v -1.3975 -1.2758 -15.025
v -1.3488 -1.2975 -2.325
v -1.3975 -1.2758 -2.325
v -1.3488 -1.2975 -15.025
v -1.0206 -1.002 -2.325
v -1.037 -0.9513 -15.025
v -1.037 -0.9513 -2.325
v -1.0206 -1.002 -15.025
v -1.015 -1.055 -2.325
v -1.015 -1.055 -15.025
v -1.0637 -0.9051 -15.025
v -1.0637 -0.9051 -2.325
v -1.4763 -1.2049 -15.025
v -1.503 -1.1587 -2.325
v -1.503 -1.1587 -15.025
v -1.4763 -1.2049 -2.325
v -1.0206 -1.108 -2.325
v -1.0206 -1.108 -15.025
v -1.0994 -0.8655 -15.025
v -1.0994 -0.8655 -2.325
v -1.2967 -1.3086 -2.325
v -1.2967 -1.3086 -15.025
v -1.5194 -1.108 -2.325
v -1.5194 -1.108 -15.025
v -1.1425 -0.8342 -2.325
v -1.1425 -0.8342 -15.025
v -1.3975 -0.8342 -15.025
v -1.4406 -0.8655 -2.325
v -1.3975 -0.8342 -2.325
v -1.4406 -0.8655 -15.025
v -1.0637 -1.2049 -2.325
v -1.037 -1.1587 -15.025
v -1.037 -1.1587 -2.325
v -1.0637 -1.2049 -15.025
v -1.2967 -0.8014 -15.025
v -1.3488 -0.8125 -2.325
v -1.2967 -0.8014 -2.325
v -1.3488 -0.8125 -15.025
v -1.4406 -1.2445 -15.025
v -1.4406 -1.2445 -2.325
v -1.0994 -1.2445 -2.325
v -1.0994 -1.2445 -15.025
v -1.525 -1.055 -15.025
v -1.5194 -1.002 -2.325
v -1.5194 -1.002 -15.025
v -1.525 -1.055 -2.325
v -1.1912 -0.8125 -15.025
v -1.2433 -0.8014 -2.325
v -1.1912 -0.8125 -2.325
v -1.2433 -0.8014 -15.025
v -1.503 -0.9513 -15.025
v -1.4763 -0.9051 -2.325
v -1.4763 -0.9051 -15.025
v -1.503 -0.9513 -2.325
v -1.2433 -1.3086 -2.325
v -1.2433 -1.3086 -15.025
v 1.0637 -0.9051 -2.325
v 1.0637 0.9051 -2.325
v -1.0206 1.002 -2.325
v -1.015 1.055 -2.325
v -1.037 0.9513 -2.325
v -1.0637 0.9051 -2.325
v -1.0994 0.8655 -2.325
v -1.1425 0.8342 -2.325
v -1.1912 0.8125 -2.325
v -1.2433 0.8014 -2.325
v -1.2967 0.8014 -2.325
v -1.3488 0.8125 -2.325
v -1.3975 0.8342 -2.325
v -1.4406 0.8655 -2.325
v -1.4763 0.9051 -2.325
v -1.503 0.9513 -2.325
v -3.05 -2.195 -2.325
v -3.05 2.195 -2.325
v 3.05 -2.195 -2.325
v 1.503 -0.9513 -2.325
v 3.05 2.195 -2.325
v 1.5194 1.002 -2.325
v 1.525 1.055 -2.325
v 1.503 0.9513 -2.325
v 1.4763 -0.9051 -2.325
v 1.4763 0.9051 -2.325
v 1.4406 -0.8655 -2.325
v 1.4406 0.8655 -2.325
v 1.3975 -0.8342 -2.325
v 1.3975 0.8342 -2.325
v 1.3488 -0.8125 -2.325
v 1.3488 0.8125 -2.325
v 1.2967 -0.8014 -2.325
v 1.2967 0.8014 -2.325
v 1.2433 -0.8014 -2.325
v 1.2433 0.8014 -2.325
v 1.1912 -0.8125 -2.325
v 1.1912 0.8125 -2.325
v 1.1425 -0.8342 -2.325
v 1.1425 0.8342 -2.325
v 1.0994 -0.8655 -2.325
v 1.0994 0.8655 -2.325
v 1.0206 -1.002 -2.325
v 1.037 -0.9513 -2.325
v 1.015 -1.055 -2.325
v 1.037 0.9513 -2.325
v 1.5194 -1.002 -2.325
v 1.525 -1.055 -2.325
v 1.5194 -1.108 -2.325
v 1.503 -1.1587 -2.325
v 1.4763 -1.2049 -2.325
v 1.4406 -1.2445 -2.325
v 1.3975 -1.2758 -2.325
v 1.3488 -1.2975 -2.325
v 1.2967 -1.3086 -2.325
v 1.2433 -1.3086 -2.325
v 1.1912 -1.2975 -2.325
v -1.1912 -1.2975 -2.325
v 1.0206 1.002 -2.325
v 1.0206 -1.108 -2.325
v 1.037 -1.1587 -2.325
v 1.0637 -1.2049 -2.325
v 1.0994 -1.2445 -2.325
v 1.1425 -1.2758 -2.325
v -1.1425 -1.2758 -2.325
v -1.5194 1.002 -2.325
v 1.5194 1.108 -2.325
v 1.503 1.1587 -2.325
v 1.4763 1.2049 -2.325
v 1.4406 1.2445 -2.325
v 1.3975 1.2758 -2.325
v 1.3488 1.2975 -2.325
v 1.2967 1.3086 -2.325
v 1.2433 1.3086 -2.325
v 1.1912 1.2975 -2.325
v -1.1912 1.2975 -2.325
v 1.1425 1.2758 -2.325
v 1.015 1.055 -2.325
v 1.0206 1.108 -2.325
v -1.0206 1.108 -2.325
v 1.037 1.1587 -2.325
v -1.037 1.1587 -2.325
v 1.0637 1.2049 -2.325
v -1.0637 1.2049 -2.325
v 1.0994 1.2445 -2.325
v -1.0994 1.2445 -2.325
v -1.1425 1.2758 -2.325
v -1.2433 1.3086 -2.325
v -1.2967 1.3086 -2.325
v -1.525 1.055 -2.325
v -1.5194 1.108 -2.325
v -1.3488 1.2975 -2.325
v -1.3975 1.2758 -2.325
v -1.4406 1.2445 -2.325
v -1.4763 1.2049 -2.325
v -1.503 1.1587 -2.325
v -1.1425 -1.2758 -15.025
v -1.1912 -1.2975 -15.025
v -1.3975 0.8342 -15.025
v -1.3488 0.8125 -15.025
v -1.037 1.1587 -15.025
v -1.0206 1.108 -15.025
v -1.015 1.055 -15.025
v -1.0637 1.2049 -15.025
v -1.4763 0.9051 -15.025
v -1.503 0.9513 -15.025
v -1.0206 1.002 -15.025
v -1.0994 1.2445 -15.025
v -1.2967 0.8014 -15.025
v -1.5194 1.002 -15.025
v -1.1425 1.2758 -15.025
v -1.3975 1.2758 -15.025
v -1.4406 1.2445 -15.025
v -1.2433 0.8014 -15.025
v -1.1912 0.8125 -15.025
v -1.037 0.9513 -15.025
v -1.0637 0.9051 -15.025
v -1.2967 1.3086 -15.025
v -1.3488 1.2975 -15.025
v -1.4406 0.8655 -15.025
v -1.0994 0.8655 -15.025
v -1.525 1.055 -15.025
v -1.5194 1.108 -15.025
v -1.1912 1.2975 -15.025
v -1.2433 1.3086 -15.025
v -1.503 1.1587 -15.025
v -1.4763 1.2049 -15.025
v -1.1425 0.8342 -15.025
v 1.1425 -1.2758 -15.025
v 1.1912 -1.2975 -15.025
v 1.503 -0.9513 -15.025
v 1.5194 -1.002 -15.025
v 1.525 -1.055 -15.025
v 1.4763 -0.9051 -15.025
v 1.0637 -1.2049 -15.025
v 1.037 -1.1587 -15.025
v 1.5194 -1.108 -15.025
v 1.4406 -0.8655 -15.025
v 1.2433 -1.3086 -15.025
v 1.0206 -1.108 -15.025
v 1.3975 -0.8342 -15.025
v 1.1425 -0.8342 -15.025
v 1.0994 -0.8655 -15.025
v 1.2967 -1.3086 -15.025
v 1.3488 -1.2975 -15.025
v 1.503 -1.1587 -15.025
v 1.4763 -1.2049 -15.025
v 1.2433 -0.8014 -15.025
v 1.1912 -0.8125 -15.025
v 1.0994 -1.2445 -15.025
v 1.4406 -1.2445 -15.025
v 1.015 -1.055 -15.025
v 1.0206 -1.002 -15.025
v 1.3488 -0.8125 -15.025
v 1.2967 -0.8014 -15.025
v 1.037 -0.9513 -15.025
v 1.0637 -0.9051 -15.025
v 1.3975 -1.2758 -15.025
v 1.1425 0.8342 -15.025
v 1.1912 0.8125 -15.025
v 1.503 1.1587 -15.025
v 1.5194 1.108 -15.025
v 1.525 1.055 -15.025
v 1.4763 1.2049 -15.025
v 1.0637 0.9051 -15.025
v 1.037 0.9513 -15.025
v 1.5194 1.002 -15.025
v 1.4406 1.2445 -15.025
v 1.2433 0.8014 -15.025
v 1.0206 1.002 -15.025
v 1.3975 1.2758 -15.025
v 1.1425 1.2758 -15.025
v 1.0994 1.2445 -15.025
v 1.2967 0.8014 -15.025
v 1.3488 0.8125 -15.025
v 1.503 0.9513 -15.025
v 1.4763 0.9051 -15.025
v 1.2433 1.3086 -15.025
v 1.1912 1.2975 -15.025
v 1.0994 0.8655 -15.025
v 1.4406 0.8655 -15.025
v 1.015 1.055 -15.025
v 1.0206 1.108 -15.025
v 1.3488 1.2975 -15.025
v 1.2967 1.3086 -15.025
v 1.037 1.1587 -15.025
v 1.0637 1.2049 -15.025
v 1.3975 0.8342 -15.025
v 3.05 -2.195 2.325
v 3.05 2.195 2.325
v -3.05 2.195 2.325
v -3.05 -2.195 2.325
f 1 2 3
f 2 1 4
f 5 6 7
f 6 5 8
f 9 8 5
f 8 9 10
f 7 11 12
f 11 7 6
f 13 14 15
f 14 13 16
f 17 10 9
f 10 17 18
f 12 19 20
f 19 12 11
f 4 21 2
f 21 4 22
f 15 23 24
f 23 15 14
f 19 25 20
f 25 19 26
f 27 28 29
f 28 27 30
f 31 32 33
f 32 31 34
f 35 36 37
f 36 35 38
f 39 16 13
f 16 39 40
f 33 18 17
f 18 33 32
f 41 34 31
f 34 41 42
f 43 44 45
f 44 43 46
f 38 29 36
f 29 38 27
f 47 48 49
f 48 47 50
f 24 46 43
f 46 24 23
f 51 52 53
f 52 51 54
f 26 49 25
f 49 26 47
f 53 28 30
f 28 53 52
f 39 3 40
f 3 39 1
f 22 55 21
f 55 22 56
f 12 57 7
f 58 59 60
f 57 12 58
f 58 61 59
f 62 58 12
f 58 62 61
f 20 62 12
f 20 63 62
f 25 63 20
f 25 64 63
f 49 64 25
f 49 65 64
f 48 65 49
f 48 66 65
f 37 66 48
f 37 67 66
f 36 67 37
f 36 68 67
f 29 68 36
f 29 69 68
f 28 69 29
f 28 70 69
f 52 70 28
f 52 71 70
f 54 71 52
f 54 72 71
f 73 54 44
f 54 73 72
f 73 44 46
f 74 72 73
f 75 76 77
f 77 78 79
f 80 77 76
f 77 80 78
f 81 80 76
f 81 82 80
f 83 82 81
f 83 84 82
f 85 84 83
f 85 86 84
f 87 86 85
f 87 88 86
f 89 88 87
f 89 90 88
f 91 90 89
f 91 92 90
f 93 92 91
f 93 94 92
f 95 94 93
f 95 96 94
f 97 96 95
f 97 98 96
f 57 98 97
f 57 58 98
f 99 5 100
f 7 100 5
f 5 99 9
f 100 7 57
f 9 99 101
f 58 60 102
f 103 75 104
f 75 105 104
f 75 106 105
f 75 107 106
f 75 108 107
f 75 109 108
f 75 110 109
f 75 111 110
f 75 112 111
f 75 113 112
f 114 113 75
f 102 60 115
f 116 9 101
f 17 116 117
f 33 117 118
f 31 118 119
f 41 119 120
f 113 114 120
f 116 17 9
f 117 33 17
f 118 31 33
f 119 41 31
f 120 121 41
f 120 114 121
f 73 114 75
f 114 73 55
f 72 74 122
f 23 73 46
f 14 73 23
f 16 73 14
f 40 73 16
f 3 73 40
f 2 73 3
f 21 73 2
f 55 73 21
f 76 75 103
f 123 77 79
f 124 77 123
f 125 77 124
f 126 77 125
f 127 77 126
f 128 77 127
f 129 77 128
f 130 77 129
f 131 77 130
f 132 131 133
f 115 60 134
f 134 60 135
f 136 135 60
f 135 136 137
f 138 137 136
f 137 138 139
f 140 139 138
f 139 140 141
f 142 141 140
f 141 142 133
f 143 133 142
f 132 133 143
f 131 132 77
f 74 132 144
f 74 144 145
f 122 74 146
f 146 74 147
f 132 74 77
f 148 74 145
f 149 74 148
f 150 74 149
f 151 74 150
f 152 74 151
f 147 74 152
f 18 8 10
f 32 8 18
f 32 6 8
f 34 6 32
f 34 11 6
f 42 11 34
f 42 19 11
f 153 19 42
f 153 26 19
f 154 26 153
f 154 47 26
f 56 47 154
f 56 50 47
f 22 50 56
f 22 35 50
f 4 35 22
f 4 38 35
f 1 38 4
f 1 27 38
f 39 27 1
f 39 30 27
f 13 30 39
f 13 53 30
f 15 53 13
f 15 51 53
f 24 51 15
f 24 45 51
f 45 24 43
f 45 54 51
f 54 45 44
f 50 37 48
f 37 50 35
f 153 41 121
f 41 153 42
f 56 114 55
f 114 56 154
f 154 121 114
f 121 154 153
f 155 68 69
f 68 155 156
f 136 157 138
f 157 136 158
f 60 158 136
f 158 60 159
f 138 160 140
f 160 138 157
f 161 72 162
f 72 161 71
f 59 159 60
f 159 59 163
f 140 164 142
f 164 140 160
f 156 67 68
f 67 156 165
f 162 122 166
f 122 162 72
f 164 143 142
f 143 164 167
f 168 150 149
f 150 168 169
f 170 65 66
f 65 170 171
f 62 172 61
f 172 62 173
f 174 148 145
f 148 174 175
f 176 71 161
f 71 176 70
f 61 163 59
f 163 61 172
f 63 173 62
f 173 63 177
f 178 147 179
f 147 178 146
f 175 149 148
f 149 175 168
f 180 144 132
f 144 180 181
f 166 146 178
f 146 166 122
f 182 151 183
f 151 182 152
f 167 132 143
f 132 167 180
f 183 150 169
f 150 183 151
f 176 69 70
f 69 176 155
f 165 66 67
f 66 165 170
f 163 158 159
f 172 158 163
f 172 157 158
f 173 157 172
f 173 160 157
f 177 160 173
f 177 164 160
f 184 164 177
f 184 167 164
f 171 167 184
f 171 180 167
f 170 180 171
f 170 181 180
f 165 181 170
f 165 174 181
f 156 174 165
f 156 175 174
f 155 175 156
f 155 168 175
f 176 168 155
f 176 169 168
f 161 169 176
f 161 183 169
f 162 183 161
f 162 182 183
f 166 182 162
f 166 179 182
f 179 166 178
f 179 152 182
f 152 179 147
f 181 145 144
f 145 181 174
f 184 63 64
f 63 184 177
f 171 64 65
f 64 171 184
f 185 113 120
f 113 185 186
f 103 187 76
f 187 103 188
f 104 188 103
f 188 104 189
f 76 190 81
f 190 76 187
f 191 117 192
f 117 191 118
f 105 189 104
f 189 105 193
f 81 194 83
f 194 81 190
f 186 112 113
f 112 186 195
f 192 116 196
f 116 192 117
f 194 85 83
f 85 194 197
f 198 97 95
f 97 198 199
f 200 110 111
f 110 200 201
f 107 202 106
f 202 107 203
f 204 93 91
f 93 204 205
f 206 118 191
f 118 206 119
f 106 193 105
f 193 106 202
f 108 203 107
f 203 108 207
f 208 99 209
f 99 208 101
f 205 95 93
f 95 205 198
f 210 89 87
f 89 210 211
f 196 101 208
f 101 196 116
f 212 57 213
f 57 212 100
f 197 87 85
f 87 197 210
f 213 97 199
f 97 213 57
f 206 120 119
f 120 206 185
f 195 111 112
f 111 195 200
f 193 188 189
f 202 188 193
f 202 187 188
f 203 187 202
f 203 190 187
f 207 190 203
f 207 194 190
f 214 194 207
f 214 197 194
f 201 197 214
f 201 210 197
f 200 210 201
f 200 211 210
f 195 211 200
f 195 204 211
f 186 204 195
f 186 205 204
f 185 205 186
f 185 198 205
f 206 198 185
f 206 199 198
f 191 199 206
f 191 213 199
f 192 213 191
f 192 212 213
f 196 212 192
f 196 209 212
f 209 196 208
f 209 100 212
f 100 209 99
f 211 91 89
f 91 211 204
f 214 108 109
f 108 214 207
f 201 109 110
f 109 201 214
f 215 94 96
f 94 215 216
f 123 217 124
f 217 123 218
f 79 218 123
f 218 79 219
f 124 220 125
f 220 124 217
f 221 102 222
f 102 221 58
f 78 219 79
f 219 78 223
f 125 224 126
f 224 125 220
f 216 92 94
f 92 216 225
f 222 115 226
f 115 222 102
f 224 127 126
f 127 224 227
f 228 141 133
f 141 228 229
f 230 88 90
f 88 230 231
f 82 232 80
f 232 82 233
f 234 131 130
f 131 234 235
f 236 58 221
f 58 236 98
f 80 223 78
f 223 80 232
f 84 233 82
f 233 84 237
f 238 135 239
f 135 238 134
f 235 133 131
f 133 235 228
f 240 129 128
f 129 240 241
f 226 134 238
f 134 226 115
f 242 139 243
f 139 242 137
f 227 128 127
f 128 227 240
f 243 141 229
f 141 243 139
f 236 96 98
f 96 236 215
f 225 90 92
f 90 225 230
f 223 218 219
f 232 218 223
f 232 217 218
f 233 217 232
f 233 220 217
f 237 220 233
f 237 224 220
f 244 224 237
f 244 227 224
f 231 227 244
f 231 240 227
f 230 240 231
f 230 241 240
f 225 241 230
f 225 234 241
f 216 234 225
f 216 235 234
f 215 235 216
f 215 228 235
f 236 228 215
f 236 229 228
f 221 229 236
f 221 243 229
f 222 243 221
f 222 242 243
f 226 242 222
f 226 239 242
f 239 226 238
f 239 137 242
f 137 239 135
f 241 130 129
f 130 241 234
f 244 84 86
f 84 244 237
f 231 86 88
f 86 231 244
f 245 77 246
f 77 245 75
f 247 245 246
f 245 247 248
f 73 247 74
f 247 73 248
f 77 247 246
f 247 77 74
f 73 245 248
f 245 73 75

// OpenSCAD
// file: ../settings.scad
// Common settings used by all scad files.

// ALL UNITS IN MILLIMETERS (MM)!!!

$fn = 30;//low-res but fast to render
//$fn = 50;//higher-res but slow to render

pi = 3.1415926535897932384626433832795;

max_footprint = 150; // 15x15 cm

bottom_clearance = 10;
bottom_clearance = 25.4/2+10;
//bottom_clearance = 30;

shell_alpha = 0.215;
//shell_alpha = 1.0;

tolerance = 0.5;

// Flat countersunk M2.5mm x 0.45mm machine screw.
screw_thread_diameter = 2.5;//2.8;//2.75;//2.4?
screw_thread_length = 5;//?
screw_head_diameter = 4.75; // M2.5
//screw_head_diameter = 5.2; // M3
screw_head_height = 1.5;//2;

screw_thread_diameter2 = 2;

unit_thickness = 5;
u = unit_thickness;

shell_thickness = unit_thickness;

// Show flags.
show_platform = 0;
show_head = 1;
show_head_shell = 0;
show_head_electronics_bb = 0;
show_battery = 1;
show_foot_cube = 0;
show_torso = 0;
show_motor = 0;
show_motor_plates = 1;
show_motor_inner_plates = 1;
show_motor_outer_plates = 1;
show_wheel = 0;//obsolete
show_tracks = 1;//
show_track_wheels = 1;
show_caster = 0;
show_rpi = 1;
show_vertical_plates = 1;//
show_horizontal_plates = 1;//
show_caster_plates = 0;//obsolete?
show_camera = 1;
show_screen = 0;
show_edge_mount = 1;
show_sonar_mount = 1;
show_recharge_mount = 1;
show_conduit = 1;
show_torso_shell = 1;
show_recharge_dock = 0;
show_head_tilt_axis = 0;
show_rpi_camera_axis = 0;
show_laser_axis = 0;

head_vertical_angle_tilt = 0;
//head_vertical_angle_tilt = 30;//max
//head_vertical_angle_tilt = 10;

torso_height = 120+20;

base_plate_diameter = max_footprint-unit_thickness*2;
base_plate_frame = 0;

head_height = 50;
head_offset_z = max_footprint/2;
head_middle_cutout = 85;

rpi_with_four_hats_and_clearance = 76;

qrd1114_w = 6.10;
qrd1114_l = 4.39;
qrd1114_h = 4.65;

dock_radius = 10;
dock_gripper_border = 2;
dock_gripper_instep = 0.9;
dock_gripper_cutout_tapper = 50;
dock_receiver_height = 5;

// Patriod Fuel+ 9000 mAh
battery_length = 90;
battery_width = 57;
battery_height = 23;
battery_offset_z = 30;//4;

wheel_diameter = 50;
wheel_offset_x = 65;
wheel_offset_z = wheel_diameter/2;
wheel_axle_diameter = 5;

//caster_diameter = 19.05; // 0.75 inches
caster_diameter = 25.45; // 1 inches
//caster_diameter = 15.875; // 5/8 inches
caster_holder_diameter = 30;//31;
caster_offset_y = base_plate_diameter/2 - caster_holder_diameter/2;

arduino_offset_x = 0;
arduino_offset_y = 0;
arduino_offset_z = 67;
arduino_offset_x2 = 0;
arduino_offset_y2 = -20;
arduino_offset_z2 = torso_height+bottom_clearance;

horizontal_plate_width = unit_thickness*8*2 - unit_thickness*2;
horizontal_plate_depth = unit_thickness*8*2;

vertical_plate_width = horizontal_plate_depth;
vertical_plate_height = unit_thickness*8;
vertical_plate_offset_x = wheel_offset_x-22.5;
vertical_plate_offset_z = vertical_plate_height/2 + unit_thickness/2;

vertical_battery_plate_height = 100 - 15;

caster_plate_width = horizontal_plate_width + unit_thickness*2;
caster_plate_mount_length = unit_thickness*4;
caster_plate_width_minor = caster_holder_diameter;

motor_switch_length = 20;
motor_switch_thickness = 6.5;
motor_switch_height = 11;
motor_switch_height_leads = 23;
motor_switch_on_height =  13.3;
motor_switch_hole_diameter = 2.5;
motor_switch_hole_offset_z = 6.5;//this plus diameter/2 is hole center from switch top
motor_switch_hole_spacing = 7.1;// holes are diameter/2 from this

motor_length = 60;
motor_width = 25;
motor_collar_width = 7;
motor_collar_height = 2.5;
motor_axle_width = 4;
motor_axle_height = 9.5;
motor_offset_x = 10;
//motor_offset_y = motor_width/2+5;
motor_offset_y = unit_thickness*3.5;
motor_offset_z = vertical_plate_height/2 - unit_thickness/2;//4;//30;
motor_mount_holes_dist = 17;
// motor countersink hole
motor_mount_holes_width = 3; // M3
motor_mount_holes_head_height = 2.2;
motor_mount_holes_head_width = 5.8;
motor_bearing_outer_diameter = 10;
motor_bearing_inner_diameter = 5.95;
motor_bearing_thickness = 2.5;

motor_unimount_idler_axle_d = screw_thread_diameter;
//motor_unimount_spacer_depth = 0.1;//too small
motor_unimount_spacer_depth = 0.5;

motor_arm_offset_y = -u*3;
motor_arm_offset_z = u*.5;

motor_plate_width = vertical_plate_width;
motor_plate_height = vertical_plate_height;
motor_plate_thickness = unit_thickness;
motor_plate_offset_z = vertical_plate_offset_z;

motor_plate_middle_thickness = 5;

wheel_hub_offset = u*3;

motor_hole_height_offset = -5;

nylon_spacer_outer_diameter = 6.35;
nylon_spacer_inner_diameter = 3.302;
nylon_spacer_length = 12.7;

track_width = unit_thickness*3;
track_offset_x = -50;
track_offset_z = .1;
//track_wheel_radius = 19;//original
track_wheel_radius = 14;
//track_wheel_hole_radius = (nylon_spacer_outer_diameter+1)/2;
track_wheel_hole_radius = motor_bearing_outer_diameter/2;

track_driver_hole_radius = (motor_axle_width)/2 + 0.1;
track_driver_set_screw_head_d = 4.1;
track_driver_set_screw_shaft_d = 2.4;
//track_wheel_width = 13.5;//original
track_wheel_width = u*2;
track_wheel_width_buffer = u*0.25;
track_offset = 3;        //distance from chassis
track_wheel_offset = track_offset;
//track_length = 250; // see tread_triangle.py, too big
//track_length = 240; // see tread_triangle.py
//track_length = 238; //inc/dec in 10 unit increments so notches match idlers
track_length = 228; //inc/dec in 10 unit increments so notches match idlers
track_radius = track_length/2/pi;
track_wheel_show_fancy = 1;
track_wheel_gap = track_wheel_width + track_wheel_width_buffer*2;
track_axle_bearing_diameter = motor_bearing_inner_diameter - 0.1;
track_tensioner_radius = 12;
track_nut_height = 3.5; //TODO
track_punchout_thickness = 0.25;//should be the same as the minimum layer thickness

head_slew_bearing_outer_diameter = 115;
head_slew_bearing_ring_thickness = 20;
head_slew_bearing_inner_diameter = head_slew_bearing_outer_diameter - head_slew_bearing_ring_thickness;
//head_slew_bearing_hole_diameter = head_slew_bearing_inner_diameter - head_slew_bearing_ring_thickness;
head_slew_bearing_hole_diameter = 12+tolerance; // slip ring https://www.adafruit.com/products/775
//head_slew_bearing_ball_diameter = 5;
head_slew_bearing_ball_diameter = 2.5; //u/2;
head_slew_bearing_height = u;//head_slew_bearing_ball_diameter*2;
head_slew_bearing_gap = 0.5;
head_slew_bearing_slew_gap = 0;
head_slew_bearing_gap_factor = 0.1;

neck_strut_width = u*7;
neck_strut_height = u*18;
neck_strut_spacing = u*8;

show_outer_race = 0;
show_inner_race_a = 1;
show_inner_race_b = 1;
show_balls = 0;
// main file
include <../settings.scad>;

module make_QRD1114(leads=1, shell_thickness=0){
	union(){
	    cube([qrd1114_w+shell_thickness, qrd1114_l+shell_thickness, qrd1114_h+shell_thickness], center=true);
	    if(leads){
    		for(i=[-1:2:1]){	for(j=[-1:2:1]){
    			translate([2.54/2*i, 2.11/2*j, -12.7/2-4.65/2])
    			cylinder(d=0.51, h=12.7, center=true);
    		}}
		}
	}
}

module make_QRD1114_housing_bb(shell_thickness=1){
    t = tolerance;
    union(){
        // main body
        cube([qrd1114_w+shell_thickness+t, qrd1114_l+shell_thickness+t, qrd1114_h+shell_thickness+t], center=true);
        
        // lead bb
        cube([
            qrd1114_w+t-1.5, // width
            qrd1114_l+shell_thickness+t, // height
            qrd1114_h+15+t // depth
        ], center=true);
    }
}

module make_QRD1114_housing(shell_thickness=1){
	t = tolerance;
    difference(){

        // main body
        make_QRD1114_housing_bb();

        // interior hollowing
        cube([qrd1114_w+t, qrd1114_l+t, qrd1114_h+t], center=true);
        
        // top cutout
        translate([0,shell_thickness*2,0])
        cube([qrd1114_w+t-0.5, qrd1114_l+t, qrd1114_h+t], center=true);
        
        // front/back cutout
        translate([0,0.5,0])
        cube([qrd1114_w+t-1.5, qrd1114_l+t+1, (qrd1114_h+t)*2], center=true);

    }
}

make_QRD1114();
//make_QRD1114_housing();
